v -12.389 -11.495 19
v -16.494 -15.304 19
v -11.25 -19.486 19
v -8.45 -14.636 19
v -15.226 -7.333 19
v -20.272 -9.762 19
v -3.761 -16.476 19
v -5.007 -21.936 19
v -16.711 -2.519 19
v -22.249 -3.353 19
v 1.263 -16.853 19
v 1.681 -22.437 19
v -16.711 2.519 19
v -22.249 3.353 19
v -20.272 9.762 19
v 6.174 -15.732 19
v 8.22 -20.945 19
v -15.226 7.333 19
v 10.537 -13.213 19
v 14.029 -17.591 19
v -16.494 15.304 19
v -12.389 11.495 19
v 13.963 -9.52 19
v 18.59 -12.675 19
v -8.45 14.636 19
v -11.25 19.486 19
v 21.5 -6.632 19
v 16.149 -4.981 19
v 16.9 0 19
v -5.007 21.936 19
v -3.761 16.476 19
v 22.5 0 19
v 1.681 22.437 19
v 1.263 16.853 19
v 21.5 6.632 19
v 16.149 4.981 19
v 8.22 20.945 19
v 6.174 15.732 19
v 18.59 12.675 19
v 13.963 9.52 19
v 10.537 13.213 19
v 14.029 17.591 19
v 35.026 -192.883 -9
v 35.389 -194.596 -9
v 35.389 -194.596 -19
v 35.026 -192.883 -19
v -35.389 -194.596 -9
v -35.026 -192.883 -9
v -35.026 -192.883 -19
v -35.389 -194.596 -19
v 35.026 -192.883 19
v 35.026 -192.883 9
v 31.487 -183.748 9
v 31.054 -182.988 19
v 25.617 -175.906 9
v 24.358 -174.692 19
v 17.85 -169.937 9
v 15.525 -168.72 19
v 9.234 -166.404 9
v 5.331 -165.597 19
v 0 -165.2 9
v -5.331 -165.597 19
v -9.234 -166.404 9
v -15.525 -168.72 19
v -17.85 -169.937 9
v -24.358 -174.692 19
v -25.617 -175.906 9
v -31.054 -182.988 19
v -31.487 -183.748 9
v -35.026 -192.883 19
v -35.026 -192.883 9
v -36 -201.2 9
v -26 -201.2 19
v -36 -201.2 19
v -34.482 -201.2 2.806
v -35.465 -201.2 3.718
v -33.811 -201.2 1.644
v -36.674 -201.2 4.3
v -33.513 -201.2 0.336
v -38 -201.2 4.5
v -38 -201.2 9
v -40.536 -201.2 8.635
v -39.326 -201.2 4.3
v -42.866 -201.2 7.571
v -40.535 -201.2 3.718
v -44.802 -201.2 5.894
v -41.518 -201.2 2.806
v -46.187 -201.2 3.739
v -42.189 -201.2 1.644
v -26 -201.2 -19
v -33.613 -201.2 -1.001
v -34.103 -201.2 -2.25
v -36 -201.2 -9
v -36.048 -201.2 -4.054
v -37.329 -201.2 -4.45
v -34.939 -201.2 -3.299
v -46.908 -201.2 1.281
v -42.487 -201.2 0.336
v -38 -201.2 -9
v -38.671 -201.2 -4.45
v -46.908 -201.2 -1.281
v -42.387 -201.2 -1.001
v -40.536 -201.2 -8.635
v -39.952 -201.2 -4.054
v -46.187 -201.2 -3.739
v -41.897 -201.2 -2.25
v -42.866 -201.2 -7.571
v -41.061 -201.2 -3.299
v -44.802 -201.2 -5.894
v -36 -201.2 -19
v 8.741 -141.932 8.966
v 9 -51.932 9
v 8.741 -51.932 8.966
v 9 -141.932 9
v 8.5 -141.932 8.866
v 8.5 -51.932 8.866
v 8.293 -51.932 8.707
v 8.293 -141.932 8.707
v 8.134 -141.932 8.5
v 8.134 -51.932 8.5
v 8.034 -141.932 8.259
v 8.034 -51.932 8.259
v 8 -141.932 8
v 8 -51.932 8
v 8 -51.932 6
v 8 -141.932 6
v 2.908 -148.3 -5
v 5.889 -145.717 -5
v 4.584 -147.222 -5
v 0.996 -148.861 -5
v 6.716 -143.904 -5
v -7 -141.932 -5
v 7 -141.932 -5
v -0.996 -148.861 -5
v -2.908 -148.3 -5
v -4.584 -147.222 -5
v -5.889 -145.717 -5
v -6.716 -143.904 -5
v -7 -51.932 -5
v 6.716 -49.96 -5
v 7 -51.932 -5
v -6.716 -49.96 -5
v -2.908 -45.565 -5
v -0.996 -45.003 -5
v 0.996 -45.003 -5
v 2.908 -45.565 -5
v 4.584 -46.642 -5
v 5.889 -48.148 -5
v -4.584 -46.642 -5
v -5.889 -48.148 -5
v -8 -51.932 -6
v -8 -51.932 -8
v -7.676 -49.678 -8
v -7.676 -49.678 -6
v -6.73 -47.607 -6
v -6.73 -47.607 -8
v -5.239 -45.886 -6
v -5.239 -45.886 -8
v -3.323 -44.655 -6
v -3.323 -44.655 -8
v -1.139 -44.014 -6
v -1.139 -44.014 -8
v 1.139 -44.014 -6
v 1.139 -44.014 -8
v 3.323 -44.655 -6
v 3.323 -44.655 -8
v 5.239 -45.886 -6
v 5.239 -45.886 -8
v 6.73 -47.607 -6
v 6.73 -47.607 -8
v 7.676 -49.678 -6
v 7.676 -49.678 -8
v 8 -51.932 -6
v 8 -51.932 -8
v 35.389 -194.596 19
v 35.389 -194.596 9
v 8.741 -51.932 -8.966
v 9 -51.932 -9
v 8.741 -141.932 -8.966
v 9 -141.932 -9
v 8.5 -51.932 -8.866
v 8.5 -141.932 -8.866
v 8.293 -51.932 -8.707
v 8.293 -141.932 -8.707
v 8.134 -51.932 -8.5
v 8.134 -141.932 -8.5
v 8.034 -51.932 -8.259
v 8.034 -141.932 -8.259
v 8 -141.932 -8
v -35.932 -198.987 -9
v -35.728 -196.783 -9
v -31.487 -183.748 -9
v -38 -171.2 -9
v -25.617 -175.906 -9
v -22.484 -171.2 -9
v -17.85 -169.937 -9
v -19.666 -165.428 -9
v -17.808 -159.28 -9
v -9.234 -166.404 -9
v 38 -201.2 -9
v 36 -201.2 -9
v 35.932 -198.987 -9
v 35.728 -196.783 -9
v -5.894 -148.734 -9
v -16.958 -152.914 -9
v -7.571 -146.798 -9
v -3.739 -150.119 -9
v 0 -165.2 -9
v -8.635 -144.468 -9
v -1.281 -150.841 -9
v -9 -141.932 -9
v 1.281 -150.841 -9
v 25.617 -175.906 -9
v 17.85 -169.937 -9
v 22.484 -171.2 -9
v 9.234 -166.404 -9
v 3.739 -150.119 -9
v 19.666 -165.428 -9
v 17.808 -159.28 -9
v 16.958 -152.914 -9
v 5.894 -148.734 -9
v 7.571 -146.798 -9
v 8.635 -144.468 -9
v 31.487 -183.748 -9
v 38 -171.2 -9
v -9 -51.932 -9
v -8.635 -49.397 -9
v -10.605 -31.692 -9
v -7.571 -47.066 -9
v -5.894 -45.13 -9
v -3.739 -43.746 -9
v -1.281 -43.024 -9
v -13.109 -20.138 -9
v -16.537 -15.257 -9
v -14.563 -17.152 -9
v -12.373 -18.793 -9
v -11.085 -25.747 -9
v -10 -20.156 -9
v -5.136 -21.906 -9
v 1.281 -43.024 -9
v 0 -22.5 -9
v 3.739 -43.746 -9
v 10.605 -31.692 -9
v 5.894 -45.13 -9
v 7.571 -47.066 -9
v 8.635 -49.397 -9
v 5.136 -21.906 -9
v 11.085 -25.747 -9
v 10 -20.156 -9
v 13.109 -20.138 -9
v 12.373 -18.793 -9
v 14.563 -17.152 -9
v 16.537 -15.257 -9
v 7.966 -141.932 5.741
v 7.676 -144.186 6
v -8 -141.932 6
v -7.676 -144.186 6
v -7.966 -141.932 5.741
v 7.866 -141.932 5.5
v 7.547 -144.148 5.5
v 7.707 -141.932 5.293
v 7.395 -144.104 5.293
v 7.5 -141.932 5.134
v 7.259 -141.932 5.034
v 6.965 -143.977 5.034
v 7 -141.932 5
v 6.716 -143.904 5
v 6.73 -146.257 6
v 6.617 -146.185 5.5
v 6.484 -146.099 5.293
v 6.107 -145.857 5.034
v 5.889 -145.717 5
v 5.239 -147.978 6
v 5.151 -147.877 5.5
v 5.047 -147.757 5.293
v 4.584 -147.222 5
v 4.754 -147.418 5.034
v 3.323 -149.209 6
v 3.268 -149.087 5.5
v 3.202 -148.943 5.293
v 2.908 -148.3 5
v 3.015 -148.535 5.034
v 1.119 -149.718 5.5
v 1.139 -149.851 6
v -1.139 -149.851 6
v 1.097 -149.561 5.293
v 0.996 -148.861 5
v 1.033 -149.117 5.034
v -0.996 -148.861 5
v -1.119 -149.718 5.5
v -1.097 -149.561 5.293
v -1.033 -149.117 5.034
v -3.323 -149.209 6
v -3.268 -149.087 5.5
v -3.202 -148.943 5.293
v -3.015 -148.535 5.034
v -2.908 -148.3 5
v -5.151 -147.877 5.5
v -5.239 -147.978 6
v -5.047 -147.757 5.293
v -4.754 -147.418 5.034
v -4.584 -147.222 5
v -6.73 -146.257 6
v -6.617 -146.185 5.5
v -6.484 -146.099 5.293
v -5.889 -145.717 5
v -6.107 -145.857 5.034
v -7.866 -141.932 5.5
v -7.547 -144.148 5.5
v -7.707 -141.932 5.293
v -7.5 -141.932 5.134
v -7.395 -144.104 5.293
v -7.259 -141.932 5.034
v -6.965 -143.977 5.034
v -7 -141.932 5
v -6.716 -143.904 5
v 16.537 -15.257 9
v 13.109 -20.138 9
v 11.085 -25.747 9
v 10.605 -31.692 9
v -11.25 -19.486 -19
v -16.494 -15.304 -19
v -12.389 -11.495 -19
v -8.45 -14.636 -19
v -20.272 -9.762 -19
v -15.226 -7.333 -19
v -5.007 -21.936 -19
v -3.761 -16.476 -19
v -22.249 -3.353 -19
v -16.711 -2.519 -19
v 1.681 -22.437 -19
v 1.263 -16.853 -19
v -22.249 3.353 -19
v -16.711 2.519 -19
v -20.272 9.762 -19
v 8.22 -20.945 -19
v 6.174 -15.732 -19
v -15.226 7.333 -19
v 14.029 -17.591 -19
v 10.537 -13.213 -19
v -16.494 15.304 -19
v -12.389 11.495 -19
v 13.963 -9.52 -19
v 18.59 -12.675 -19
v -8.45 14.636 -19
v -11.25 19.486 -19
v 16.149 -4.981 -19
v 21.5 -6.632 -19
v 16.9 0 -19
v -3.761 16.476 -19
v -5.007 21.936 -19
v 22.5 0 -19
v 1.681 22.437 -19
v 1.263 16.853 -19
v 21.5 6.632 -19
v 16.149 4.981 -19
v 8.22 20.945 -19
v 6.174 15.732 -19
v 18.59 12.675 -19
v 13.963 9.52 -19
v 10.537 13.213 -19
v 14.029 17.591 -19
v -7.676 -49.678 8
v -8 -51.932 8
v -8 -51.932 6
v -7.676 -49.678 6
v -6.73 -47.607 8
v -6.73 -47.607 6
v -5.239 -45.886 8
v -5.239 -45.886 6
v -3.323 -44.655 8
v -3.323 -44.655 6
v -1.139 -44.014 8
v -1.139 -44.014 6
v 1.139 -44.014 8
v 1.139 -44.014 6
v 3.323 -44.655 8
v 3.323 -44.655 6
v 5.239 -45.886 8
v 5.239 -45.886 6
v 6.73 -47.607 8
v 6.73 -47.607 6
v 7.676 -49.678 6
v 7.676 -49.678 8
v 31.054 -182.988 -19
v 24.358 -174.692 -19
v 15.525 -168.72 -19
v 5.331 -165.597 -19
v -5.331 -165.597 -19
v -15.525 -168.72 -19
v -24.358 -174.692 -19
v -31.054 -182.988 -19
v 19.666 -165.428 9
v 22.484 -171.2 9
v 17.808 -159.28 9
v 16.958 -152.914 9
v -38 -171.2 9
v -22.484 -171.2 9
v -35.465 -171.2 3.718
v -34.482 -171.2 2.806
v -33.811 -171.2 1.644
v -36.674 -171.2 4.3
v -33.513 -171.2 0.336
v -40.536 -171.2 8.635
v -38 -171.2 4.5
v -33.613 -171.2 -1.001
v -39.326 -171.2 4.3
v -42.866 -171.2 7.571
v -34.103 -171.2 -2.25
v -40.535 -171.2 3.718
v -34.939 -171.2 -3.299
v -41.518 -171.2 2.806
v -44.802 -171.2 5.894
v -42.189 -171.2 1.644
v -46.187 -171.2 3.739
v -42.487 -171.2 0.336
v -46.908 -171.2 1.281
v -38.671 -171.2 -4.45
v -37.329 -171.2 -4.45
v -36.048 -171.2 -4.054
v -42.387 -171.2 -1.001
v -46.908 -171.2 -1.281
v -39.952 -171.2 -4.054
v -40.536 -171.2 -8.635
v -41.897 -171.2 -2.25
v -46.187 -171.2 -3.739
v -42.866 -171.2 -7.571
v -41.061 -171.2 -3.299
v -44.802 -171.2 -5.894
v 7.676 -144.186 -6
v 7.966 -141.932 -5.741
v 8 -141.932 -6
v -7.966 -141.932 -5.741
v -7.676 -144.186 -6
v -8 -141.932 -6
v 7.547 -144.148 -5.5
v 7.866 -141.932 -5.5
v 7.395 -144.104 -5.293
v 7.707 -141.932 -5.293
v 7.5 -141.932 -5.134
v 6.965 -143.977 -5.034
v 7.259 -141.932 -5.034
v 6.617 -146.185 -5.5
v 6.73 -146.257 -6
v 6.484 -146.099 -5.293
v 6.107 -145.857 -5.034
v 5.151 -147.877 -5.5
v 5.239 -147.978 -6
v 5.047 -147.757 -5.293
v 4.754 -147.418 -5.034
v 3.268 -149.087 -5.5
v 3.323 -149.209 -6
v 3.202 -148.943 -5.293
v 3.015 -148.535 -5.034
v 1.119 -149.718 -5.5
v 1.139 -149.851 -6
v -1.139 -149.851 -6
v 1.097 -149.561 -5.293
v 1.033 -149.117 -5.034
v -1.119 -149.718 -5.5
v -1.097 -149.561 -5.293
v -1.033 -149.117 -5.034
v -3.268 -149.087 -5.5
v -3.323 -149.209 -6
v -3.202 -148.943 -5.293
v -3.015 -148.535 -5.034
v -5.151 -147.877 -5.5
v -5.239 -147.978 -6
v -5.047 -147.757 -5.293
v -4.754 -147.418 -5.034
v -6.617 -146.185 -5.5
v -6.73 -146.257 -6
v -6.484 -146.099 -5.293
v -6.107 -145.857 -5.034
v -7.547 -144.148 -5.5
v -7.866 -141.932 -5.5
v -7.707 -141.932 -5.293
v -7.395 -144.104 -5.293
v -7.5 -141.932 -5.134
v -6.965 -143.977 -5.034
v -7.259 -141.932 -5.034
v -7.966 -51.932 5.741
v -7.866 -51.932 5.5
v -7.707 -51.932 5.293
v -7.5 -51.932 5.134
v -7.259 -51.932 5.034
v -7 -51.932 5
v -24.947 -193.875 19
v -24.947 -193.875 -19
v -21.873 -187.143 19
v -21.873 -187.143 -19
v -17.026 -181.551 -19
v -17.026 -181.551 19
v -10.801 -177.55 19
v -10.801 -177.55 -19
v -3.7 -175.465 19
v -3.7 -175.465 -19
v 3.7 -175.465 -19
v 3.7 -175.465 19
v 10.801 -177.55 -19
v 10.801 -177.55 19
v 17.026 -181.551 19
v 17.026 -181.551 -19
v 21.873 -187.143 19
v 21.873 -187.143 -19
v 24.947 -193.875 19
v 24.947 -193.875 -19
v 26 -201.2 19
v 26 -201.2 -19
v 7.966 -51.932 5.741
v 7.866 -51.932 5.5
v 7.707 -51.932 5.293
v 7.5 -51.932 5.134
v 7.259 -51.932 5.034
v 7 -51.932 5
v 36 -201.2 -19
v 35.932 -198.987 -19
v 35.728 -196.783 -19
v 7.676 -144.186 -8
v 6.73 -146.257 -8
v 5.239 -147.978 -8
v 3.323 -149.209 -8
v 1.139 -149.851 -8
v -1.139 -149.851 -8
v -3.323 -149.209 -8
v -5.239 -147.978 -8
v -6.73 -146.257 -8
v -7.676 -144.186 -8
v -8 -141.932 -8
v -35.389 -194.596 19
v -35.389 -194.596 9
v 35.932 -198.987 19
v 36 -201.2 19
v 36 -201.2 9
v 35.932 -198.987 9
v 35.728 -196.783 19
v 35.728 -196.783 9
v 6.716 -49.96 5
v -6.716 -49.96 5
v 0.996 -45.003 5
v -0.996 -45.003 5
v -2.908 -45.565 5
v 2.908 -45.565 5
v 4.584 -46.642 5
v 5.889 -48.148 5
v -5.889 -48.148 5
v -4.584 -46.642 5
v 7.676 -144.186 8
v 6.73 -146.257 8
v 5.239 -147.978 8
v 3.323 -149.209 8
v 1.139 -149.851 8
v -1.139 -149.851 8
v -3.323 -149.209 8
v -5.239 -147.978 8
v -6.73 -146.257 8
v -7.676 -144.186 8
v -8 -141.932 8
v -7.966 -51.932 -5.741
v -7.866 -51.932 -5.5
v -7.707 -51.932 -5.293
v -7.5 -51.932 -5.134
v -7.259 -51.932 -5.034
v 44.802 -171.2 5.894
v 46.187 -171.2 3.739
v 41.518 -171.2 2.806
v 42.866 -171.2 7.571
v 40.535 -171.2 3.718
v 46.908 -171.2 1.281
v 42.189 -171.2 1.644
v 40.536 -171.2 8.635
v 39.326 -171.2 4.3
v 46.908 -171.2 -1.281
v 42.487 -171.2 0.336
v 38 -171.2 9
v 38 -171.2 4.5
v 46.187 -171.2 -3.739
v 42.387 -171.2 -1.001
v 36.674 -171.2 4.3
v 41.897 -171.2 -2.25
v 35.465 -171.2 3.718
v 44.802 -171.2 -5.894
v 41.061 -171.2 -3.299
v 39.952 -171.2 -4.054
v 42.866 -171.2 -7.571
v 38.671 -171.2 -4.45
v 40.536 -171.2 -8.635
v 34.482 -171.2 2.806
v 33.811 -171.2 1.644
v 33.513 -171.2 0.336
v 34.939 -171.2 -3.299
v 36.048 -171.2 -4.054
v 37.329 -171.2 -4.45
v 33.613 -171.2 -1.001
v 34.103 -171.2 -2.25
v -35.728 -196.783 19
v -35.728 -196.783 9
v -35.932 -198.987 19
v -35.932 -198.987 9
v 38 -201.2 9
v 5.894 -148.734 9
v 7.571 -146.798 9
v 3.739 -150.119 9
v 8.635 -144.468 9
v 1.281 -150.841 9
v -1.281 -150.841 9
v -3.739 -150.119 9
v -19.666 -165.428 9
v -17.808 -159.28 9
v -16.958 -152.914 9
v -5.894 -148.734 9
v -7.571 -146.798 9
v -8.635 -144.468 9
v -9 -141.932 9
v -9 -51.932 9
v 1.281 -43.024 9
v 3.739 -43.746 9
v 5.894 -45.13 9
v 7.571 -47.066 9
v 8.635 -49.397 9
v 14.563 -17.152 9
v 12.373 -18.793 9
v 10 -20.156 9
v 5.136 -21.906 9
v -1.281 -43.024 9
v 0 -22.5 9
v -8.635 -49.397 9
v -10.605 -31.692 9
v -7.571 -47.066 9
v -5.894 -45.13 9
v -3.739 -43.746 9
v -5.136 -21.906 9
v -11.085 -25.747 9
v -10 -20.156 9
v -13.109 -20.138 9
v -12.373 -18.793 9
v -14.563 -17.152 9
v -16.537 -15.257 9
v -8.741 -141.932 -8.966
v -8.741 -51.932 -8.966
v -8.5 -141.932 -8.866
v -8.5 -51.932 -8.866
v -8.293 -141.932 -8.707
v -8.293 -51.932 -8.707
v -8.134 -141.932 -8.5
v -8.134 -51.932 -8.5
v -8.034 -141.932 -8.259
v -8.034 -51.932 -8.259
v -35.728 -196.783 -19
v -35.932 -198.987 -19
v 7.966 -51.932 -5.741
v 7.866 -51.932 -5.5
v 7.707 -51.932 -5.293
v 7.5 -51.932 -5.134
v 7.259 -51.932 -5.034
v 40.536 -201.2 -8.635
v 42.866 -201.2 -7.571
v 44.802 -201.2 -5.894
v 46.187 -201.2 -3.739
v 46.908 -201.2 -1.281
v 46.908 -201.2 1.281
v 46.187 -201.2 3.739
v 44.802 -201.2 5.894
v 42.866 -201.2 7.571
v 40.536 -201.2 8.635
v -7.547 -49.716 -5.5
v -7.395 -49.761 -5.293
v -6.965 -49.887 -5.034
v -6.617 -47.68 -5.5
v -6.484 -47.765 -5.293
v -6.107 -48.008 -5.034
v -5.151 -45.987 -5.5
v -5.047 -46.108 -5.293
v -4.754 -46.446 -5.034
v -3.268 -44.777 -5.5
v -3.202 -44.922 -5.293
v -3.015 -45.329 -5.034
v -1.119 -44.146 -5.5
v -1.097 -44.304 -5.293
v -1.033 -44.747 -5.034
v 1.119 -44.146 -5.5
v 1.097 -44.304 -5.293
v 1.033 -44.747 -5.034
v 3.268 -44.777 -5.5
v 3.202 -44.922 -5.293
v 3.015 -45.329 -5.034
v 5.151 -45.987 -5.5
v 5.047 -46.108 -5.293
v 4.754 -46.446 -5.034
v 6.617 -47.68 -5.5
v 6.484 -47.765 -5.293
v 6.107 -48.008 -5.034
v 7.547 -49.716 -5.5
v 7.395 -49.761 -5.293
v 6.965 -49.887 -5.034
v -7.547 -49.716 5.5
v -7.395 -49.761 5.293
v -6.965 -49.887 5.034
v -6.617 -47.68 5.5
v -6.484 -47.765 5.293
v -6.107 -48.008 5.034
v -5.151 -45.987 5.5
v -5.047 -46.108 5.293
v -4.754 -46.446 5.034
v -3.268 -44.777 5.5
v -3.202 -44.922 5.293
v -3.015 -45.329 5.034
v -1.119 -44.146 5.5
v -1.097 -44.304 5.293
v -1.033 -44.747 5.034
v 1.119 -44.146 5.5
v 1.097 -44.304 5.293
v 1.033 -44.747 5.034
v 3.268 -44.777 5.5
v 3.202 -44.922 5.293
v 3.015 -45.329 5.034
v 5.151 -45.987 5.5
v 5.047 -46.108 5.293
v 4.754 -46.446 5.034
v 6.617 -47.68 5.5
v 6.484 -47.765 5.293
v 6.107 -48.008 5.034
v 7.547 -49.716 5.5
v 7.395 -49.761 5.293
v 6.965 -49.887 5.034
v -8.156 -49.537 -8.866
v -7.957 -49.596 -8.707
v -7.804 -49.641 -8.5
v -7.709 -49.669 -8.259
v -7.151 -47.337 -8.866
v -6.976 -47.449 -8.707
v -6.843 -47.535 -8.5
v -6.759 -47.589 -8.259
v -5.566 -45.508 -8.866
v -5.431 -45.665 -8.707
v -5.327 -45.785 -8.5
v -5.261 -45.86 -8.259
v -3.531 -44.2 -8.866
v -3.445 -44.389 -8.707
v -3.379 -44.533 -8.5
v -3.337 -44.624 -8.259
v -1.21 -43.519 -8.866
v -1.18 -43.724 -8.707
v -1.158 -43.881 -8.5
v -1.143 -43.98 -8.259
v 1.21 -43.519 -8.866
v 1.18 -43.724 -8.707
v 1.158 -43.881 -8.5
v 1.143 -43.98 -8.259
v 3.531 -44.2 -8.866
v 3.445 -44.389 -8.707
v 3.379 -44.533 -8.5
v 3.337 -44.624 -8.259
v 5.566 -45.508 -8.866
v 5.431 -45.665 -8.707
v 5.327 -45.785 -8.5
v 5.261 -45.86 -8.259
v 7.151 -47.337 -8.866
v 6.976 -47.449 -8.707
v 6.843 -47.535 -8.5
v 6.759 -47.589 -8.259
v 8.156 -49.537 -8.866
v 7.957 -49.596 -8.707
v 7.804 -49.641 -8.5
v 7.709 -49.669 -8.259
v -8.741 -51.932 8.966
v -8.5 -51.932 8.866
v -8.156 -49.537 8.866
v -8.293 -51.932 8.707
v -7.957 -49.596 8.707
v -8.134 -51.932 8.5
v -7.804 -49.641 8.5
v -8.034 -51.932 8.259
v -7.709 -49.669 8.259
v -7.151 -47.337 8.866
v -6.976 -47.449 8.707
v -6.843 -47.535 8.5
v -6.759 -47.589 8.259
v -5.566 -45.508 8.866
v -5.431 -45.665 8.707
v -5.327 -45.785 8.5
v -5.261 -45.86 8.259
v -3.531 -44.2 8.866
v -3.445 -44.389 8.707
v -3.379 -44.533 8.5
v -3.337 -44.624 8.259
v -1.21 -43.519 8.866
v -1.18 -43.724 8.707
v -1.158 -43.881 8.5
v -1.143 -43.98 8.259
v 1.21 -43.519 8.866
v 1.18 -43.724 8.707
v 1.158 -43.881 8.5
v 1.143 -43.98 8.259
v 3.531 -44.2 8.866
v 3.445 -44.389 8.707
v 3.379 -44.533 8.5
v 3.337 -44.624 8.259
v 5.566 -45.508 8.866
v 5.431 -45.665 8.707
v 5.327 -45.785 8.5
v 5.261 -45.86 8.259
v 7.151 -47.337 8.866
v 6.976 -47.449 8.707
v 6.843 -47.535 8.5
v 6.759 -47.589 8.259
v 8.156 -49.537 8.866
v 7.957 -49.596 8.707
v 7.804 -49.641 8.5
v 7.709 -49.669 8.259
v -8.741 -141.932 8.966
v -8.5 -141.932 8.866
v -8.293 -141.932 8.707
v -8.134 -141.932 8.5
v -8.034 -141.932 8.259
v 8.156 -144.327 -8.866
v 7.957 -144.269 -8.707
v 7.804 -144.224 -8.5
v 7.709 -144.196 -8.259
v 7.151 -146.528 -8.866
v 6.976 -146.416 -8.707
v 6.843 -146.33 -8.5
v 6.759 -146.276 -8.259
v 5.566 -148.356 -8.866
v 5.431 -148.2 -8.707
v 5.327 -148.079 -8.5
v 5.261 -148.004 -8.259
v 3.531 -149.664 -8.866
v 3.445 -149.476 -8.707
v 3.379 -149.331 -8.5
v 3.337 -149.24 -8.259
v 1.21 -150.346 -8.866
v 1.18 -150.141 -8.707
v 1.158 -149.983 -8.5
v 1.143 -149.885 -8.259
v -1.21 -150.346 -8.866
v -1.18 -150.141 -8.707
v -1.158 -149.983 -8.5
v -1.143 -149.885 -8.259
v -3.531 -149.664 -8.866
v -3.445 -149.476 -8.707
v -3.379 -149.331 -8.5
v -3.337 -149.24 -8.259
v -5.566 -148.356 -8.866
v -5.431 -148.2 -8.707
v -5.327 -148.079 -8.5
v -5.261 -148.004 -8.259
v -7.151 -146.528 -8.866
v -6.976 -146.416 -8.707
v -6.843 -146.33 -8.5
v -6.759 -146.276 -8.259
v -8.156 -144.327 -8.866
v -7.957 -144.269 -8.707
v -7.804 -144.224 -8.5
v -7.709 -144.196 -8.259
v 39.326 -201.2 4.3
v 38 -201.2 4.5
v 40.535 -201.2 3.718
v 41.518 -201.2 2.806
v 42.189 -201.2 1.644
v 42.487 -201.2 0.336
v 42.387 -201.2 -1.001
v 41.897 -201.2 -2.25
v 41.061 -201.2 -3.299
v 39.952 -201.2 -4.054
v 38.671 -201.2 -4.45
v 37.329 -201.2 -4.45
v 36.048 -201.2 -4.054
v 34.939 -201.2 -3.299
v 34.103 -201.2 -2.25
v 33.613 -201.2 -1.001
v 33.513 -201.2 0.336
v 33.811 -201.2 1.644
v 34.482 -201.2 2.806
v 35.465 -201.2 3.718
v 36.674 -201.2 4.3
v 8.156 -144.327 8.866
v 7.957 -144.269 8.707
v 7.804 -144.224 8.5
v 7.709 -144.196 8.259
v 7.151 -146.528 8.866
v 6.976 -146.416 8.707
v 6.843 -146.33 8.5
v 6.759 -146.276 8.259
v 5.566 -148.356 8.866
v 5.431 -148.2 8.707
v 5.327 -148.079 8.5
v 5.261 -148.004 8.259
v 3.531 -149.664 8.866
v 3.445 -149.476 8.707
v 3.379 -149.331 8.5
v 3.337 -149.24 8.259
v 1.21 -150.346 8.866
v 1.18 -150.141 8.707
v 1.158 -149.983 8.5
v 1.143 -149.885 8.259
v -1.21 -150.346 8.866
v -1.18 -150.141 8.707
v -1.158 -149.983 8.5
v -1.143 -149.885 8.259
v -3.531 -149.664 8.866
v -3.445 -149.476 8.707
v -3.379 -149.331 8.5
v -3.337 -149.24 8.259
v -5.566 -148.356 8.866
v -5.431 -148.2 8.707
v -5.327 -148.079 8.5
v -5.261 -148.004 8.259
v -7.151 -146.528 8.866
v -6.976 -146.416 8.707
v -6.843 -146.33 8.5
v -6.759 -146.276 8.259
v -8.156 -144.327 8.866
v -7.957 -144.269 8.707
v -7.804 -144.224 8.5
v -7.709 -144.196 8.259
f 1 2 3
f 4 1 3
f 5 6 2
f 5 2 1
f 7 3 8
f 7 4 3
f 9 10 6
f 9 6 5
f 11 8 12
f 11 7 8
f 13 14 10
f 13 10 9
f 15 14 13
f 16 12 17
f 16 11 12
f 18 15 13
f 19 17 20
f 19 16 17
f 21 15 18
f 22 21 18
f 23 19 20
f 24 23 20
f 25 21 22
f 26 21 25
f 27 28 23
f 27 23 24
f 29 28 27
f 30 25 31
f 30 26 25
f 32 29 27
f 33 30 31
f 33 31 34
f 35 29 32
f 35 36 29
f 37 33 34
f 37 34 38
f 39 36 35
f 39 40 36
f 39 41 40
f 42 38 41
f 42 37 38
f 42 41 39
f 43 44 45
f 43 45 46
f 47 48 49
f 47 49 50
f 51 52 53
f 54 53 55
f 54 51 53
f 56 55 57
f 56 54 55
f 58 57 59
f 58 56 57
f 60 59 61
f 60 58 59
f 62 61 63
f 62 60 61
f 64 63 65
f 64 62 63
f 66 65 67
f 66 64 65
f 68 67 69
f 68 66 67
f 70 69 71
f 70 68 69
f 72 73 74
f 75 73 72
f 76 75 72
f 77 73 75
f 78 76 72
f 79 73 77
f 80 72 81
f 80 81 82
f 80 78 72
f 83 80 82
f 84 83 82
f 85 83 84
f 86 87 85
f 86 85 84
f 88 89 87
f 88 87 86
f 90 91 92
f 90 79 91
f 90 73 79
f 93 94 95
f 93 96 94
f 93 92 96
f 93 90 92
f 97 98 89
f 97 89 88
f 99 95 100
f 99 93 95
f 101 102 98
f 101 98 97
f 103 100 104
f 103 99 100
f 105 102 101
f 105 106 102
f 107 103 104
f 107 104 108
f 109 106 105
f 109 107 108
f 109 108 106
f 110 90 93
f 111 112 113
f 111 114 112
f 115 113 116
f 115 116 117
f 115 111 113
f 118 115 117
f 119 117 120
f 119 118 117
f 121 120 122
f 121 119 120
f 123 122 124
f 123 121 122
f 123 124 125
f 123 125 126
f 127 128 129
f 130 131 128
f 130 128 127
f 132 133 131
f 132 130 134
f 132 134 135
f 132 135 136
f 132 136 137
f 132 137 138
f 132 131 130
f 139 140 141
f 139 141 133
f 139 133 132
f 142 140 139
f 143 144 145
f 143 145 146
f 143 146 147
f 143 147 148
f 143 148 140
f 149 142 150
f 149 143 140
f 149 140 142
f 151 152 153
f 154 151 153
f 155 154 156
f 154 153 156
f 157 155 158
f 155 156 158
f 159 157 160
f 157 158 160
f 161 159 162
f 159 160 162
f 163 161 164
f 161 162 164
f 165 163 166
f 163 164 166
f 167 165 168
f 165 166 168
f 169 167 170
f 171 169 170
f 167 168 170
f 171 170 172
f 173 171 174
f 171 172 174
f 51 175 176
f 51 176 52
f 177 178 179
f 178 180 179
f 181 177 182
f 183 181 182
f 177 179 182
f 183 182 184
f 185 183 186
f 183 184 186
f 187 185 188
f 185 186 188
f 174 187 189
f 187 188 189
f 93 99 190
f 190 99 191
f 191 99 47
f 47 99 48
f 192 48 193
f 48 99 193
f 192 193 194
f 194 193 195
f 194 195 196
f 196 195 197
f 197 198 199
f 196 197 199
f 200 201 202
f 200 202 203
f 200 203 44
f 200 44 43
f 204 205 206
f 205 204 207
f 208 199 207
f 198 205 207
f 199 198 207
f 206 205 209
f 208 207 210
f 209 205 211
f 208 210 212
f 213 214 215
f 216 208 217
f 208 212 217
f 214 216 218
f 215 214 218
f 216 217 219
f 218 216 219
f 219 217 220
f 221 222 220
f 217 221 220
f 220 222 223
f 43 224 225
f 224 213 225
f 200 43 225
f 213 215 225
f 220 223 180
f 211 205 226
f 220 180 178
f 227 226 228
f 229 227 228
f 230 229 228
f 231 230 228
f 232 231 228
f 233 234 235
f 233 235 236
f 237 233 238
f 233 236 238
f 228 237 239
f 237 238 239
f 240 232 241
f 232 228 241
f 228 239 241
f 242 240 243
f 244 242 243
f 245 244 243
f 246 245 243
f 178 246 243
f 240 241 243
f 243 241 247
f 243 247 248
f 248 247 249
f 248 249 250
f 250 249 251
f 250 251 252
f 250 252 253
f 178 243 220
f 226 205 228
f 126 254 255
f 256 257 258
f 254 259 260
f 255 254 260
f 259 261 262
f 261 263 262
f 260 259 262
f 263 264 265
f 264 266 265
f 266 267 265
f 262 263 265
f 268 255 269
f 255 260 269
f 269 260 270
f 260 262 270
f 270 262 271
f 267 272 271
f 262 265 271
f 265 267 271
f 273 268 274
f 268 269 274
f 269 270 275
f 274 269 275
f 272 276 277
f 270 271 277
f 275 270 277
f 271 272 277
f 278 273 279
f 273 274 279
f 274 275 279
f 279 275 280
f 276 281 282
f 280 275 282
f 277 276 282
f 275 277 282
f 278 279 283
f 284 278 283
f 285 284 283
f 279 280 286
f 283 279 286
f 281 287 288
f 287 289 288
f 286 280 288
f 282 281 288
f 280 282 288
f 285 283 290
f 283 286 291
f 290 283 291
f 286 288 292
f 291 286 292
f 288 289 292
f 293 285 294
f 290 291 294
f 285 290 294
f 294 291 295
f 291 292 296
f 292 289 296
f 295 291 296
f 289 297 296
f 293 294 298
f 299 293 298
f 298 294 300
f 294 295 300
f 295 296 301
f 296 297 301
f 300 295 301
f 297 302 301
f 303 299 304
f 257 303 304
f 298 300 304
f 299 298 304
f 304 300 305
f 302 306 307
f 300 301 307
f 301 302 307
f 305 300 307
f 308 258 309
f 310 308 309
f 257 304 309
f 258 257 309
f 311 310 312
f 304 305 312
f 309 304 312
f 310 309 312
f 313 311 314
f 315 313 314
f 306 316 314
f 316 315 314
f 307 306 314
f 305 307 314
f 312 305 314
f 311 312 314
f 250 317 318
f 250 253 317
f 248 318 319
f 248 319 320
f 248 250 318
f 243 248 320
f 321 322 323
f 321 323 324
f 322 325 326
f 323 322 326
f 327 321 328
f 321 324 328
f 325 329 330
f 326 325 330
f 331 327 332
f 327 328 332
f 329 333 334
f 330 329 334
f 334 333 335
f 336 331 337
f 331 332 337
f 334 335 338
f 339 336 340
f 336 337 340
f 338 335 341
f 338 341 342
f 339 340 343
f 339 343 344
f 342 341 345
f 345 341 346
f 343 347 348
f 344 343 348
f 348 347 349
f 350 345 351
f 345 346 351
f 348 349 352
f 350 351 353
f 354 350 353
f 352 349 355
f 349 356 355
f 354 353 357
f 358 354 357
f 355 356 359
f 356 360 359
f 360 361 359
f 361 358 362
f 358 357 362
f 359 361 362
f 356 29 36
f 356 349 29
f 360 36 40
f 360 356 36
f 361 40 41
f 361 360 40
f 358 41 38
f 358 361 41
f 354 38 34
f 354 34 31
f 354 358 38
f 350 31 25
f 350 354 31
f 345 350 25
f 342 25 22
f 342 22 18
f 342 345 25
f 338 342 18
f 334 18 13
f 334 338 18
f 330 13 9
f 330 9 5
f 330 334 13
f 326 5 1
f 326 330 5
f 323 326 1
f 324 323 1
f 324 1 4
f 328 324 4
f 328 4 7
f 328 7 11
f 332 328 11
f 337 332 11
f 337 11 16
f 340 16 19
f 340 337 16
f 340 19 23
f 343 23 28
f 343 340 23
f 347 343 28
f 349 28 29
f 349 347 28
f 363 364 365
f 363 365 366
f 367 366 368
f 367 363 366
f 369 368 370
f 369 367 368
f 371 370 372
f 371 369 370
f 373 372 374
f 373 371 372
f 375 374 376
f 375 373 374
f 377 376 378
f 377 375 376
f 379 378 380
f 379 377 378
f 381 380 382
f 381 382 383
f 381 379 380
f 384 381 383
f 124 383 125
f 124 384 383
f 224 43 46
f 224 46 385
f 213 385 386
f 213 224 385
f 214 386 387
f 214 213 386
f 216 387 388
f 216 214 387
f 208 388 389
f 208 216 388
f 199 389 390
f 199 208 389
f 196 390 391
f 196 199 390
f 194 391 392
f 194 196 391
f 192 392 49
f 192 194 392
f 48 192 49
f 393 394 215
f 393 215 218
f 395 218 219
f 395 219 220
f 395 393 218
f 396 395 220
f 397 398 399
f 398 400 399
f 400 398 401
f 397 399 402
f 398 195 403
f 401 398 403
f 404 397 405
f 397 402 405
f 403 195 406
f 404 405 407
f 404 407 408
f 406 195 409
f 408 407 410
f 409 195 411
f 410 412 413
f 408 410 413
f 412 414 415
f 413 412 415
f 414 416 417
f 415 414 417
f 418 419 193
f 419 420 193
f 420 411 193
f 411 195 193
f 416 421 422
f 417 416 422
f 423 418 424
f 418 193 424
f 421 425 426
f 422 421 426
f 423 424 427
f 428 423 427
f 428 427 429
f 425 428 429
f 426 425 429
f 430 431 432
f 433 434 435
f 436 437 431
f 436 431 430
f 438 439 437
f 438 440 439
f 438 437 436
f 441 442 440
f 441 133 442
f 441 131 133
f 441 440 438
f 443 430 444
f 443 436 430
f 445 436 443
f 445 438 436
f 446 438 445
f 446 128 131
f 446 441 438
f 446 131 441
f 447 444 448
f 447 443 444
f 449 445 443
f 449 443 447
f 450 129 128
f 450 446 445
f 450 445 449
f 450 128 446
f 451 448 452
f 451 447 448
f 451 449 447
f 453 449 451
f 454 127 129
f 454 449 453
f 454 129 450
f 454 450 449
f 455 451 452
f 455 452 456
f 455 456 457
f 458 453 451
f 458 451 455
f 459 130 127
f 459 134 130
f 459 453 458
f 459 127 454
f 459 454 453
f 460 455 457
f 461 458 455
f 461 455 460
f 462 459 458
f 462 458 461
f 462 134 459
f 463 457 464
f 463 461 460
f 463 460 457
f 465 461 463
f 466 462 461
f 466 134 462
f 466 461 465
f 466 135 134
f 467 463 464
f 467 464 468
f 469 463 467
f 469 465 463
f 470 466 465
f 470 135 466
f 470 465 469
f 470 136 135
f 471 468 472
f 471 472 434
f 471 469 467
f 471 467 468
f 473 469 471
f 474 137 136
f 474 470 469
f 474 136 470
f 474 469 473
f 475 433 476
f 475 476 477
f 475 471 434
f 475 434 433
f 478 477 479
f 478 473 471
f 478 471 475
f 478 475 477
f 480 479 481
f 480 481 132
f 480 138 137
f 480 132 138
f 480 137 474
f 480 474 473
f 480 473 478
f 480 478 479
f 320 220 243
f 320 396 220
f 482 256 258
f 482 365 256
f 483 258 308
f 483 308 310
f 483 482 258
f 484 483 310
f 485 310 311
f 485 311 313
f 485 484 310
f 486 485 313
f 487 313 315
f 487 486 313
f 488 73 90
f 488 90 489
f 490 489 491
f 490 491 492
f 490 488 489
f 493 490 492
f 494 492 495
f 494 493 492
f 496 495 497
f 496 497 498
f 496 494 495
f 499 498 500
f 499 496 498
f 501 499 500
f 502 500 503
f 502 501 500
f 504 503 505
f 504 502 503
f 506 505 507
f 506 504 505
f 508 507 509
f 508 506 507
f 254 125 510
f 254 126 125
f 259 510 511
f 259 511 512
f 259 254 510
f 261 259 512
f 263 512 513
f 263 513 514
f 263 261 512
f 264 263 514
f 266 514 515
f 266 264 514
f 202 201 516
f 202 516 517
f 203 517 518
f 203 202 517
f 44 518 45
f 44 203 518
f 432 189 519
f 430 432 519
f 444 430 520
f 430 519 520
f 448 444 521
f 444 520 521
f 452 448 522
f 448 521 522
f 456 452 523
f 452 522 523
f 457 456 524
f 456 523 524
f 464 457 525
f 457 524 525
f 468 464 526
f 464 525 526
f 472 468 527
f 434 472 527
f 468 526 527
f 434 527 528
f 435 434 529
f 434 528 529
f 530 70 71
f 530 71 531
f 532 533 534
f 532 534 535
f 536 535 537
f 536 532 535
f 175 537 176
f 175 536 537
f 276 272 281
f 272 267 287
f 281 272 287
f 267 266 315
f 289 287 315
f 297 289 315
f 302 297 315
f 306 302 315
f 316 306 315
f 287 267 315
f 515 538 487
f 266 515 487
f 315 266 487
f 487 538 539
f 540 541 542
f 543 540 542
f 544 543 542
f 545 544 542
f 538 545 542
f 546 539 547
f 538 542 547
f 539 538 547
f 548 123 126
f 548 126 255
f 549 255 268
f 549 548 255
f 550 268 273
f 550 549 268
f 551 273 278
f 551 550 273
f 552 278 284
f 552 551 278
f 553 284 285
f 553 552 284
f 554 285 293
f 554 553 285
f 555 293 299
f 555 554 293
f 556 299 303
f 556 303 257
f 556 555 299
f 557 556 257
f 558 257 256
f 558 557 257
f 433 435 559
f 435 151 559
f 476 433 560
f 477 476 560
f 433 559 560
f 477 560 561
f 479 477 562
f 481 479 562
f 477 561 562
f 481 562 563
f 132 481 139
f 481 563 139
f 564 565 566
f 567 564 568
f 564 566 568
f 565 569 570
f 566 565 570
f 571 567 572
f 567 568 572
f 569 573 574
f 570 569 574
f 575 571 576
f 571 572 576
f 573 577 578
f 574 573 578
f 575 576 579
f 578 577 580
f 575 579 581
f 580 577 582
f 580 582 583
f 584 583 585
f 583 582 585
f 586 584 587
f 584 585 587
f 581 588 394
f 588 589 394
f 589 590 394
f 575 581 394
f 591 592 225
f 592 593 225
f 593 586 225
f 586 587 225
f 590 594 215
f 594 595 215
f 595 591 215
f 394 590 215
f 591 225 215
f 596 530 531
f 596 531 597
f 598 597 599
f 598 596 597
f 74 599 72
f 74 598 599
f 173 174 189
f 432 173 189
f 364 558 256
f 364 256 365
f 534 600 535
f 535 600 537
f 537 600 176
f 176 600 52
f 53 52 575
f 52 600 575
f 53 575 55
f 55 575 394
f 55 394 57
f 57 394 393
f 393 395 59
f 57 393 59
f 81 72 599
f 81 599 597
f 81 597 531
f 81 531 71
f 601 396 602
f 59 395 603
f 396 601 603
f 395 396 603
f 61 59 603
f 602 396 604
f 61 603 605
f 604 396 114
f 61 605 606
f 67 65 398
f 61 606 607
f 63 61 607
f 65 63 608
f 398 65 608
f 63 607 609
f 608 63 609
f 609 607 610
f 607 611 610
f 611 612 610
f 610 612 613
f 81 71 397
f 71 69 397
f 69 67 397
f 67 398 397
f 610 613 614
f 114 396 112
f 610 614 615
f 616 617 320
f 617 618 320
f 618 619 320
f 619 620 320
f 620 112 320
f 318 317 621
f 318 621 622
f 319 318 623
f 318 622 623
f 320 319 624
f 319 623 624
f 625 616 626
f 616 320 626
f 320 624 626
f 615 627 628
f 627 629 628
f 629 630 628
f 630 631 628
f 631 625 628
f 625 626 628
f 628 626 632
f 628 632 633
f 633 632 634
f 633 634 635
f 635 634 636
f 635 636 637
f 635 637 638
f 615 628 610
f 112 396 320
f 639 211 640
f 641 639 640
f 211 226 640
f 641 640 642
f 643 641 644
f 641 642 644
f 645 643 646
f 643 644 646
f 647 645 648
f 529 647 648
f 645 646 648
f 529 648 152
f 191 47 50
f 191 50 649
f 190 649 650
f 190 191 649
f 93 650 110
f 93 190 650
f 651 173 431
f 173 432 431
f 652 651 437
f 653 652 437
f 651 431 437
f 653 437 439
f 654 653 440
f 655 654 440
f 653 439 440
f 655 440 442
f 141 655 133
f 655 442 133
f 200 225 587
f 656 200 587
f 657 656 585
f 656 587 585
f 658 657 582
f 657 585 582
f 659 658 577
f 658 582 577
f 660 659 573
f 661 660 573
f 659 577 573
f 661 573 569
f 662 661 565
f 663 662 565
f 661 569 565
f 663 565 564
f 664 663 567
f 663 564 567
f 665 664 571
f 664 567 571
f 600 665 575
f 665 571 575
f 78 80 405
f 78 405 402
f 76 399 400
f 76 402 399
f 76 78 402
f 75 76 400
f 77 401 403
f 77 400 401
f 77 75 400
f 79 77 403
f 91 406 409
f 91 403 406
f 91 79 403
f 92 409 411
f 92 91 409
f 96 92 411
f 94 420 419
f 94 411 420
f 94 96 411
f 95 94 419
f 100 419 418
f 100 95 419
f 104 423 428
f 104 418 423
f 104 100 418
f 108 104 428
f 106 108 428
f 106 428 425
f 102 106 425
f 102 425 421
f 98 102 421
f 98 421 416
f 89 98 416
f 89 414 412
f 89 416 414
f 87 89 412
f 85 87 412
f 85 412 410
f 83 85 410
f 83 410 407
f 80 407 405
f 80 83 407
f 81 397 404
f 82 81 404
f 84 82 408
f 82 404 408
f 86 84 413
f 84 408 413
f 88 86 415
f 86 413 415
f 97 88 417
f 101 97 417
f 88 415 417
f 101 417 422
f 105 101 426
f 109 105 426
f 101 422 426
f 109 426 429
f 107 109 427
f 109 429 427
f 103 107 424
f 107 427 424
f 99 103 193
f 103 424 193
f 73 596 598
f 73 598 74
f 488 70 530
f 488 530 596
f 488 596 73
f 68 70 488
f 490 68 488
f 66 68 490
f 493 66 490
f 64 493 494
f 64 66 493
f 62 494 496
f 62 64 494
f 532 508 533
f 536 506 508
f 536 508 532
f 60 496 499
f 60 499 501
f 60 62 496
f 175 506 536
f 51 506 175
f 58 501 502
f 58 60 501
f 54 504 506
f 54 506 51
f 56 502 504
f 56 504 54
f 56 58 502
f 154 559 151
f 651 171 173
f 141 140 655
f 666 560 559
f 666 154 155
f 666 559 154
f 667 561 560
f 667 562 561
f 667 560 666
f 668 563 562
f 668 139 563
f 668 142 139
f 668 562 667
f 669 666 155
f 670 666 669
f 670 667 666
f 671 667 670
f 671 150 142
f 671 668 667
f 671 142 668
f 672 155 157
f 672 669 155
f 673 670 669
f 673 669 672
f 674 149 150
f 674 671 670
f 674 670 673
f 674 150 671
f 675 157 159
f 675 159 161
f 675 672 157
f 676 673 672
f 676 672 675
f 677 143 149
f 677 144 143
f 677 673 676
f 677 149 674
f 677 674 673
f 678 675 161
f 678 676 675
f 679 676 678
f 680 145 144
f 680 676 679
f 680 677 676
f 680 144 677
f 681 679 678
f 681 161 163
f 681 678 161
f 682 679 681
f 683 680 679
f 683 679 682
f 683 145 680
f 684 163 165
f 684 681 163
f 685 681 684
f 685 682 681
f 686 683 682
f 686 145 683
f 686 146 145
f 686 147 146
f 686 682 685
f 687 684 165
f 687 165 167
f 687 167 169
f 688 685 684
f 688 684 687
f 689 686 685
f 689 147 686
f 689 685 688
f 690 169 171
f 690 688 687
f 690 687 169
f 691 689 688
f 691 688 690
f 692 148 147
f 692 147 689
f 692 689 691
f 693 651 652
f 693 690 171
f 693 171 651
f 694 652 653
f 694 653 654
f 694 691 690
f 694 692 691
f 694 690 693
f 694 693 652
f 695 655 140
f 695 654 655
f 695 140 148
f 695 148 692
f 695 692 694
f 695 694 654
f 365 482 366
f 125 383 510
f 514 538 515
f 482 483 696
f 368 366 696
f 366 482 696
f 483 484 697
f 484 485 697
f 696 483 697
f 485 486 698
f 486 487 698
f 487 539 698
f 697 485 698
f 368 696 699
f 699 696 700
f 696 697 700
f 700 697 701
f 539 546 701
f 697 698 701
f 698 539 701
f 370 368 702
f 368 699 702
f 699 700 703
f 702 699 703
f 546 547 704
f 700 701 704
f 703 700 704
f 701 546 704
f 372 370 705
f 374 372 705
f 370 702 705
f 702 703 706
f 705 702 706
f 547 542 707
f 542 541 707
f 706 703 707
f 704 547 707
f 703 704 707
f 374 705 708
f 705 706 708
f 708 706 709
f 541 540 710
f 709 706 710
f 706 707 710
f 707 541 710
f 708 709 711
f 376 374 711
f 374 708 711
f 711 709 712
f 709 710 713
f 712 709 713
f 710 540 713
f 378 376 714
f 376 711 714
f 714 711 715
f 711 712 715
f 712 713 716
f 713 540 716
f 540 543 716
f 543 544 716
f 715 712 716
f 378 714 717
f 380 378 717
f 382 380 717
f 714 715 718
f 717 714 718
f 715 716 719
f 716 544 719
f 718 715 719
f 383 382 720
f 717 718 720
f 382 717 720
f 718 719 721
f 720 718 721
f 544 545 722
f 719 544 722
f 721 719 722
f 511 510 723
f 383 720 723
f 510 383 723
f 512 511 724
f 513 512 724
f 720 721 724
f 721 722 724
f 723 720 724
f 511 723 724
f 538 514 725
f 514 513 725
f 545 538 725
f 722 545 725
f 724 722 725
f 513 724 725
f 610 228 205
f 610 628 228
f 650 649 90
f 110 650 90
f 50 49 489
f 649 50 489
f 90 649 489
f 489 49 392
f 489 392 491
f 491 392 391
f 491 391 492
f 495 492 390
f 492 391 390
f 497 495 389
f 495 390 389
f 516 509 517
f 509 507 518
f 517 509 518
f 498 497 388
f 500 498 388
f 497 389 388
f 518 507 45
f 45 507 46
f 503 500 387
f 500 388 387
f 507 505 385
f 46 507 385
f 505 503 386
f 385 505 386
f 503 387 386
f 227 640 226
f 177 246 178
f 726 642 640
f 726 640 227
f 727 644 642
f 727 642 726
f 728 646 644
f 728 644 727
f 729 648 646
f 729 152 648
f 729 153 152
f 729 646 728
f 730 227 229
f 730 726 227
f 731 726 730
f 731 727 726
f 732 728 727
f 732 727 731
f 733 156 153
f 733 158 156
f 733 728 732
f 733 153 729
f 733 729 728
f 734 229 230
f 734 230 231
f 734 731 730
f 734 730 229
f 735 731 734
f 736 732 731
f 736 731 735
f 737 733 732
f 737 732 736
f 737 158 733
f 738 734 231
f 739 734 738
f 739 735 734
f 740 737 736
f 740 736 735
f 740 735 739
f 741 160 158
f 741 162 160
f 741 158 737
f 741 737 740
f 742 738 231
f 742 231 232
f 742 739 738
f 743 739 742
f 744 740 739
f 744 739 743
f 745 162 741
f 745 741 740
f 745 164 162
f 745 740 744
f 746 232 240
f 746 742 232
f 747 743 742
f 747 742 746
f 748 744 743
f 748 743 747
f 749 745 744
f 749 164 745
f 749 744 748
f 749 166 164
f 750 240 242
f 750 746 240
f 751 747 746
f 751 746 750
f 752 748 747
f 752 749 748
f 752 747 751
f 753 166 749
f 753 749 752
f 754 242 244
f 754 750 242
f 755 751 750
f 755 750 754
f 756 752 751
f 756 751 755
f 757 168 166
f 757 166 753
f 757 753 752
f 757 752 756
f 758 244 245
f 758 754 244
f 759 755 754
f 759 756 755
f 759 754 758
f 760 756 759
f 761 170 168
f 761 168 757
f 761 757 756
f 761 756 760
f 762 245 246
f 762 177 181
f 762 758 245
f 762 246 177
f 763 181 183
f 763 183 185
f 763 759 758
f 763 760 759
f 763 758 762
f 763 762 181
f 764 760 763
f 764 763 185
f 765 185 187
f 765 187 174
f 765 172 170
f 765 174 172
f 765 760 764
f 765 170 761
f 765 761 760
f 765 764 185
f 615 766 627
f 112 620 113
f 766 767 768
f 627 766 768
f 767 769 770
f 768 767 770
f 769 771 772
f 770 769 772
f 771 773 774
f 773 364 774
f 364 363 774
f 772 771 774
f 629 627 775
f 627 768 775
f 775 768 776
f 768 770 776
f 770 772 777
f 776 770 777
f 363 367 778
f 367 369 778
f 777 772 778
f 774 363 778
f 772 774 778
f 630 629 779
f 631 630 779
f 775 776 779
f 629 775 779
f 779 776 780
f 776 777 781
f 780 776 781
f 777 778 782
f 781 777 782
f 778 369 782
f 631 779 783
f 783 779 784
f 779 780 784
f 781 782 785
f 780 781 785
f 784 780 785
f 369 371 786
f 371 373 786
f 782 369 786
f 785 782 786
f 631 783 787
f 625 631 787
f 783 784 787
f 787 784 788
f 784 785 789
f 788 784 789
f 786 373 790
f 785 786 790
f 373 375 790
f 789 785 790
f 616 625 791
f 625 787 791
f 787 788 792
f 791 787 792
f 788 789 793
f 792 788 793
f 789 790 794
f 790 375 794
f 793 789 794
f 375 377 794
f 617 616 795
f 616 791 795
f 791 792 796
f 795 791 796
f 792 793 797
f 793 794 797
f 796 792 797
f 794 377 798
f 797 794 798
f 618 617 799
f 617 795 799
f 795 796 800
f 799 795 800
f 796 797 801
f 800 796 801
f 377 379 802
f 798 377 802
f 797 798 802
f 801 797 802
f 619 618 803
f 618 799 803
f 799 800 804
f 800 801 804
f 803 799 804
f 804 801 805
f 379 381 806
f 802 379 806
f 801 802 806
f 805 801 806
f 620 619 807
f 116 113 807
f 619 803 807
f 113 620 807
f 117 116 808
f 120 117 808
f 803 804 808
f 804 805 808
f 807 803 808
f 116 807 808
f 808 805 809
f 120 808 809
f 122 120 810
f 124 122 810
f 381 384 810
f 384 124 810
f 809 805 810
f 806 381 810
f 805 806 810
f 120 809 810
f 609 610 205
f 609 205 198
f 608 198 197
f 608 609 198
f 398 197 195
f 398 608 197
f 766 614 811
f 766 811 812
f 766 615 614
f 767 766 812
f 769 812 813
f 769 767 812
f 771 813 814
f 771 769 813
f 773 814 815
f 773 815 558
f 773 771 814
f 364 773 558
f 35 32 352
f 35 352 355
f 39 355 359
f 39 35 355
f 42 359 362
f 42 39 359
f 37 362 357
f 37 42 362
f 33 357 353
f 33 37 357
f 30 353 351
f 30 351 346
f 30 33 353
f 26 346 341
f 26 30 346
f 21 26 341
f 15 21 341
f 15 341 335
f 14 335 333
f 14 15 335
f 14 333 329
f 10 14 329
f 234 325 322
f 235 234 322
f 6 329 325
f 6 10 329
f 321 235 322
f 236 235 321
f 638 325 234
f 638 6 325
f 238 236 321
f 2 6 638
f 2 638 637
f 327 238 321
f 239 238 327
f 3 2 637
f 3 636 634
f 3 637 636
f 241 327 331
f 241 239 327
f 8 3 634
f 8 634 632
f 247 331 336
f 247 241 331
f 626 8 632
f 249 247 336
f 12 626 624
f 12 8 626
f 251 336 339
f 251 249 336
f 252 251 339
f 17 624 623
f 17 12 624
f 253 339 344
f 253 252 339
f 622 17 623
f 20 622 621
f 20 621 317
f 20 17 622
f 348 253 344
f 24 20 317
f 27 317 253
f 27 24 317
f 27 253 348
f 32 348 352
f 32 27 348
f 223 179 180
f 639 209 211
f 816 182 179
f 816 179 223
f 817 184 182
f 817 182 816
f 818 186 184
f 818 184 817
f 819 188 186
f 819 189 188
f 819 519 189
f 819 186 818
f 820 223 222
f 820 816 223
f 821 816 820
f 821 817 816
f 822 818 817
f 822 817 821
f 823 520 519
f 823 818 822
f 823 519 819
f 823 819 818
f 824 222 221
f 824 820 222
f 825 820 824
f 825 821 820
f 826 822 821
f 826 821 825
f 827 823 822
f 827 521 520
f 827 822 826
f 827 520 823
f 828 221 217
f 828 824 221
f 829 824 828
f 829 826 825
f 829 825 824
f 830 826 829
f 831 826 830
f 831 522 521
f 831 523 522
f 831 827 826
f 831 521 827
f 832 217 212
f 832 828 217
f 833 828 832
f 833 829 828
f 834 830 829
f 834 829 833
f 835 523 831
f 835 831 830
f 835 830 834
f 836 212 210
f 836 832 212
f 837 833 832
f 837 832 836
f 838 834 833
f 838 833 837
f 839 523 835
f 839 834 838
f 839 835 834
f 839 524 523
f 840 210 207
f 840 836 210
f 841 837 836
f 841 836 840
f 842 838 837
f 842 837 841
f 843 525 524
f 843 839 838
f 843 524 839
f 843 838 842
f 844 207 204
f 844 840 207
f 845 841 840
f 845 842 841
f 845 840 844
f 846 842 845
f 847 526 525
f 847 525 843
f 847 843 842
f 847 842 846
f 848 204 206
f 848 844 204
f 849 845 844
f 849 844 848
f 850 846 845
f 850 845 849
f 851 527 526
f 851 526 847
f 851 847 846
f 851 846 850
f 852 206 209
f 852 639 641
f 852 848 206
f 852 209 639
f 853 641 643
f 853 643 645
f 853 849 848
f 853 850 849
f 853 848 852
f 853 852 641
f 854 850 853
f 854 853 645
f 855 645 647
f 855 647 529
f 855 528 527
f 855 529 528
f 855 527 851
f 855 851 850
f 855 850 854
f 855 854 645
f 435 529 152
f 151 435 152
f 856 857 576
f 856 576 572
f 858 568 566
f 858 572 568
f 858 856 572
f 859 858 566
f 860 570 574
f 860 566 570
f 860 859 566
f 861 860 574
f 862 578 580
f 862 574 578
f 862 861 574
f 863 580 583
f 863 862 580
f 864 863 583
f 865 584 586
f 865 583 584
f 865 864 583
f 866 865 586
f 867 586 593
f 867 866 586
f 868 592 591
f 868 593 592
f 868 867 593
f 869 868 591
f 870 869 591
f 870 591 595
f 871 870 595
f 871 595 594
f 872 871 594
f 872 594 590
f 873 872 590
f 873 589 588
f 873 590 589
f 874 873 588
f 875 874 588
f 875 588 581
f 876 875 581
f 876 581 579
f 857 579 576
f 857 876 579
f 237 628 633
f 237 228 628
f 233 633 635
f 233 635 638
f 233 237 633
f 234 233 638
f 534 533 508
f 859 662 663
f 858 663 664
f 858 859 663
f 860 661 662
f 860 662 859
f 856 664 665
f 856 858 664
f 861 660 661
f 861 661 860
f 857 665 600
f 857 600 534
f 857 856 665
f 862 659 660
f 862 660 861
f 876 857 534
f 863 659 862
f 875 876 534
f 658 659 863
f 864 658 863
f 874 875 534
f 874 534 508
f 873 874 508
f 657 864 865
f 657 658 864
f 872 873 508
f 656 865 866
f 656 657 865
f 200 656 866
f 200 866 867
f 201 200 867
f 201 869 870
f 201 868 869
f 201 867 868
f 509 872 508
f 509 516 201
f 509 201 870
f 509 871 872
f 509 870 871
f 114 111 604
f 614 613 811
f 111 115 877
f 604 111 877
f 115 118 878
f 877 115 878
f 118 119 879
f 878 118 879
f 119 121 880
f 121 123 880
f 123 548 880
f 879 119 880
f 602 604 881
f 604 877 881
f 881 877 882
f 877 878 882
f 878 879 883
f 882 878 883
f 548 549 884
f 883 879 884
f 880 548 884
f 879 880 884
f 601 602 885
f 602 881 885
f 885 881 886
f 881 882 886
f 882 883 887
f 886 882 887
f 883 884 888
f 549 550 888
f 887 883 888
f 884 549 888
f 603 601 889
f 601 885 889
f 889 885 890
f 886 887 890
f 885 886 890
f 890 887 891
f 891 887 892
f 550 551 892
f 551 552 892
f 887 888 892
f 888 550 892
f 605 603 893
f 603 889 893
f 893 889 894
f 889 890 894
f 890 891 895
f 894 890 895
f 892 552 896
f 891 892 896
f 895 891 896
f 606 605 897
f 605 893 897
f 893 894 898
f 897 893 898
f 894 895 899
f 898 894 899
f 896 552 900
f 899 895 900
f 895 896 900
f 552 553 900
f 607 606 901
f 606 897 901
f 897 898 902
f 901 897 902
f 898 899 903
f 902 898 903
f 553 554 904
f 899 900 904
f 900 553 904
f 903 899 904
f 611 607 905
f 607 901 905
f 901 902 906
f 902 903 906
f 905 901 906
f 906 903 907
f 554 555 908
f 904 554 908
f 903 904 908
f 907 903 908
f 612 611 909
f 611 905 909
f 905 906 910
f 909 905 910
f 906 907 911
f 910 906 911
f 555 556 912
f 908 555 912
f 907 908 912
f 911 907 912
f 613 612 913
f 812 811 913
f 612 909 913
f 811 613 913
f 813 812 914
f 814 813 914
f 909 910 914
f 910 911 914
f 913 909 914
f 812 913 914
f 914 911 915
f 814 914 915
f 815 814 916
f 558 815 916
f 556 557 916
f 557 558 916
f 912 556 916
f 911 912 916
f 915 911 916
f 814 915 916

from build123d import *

# Parameters (mm, degrees)
BOSS_EXTRUDE4_DEPTH     = 19
SKETCH1_R               = 22.5
SKETCH1_R_2             = 16.9
BOSS_EXTRUDE4_2_DEPTH   = 19
BOSS_EXTRUDE5_DEPTH     = 9
CUT_EXTRUDE1_DEPTH      = 4
FILLET1_R               = 1
FILLET2_R               = 22.5
FILLET3_R               = 40
BOSS_EXTRUDE6_DEPTH     = 30
CUT_EXTRUDE2_DEPTH      = 209.505251732
CUT_EXTRUDE2_DEPTH_BACK = 209.505251732
SKETCH6_R               = 26
CUT_EXTRUDE3_DEPTH      = 201.224099449
CUT_EXTRUDE3_DEPTH_BACK = 201.224099449
SKETCH7_R               = 4.5


with BuildPart() as part:
    # Sketch1 → Boss-Extrude4 (new, symmetric)
    with BuildSketch(Plane.XY):
        with BuildLine():
            Line((-35.026029259, -192.882712321), (-35.389042583, -194.595784299))
            ThreePointArc((-35.389042583, -194.595784299), (-35.846935246, -197.883792302), (-36, -201.2))
            Line((-36, -201.2), (-26, -201.2))
            ThreePointArc((-26, -201.2), (0, -175.2), (26, -201.2))
            Line((26, -201.2), (36, -201.2))
            ThreePointArc((36, -201.2), (35.846935246, -197.883792302), (35.389042583, -194.595784299))
            Line((35.389042583, -194.595784299), (35.026029259, -192.882712321))
            ThreePointArc((35.026029259, -192.882712321), (0, -165.2), (-35.026029259, -192.882712321))
        make_face()
    extrude(amount=BOSS_EXTRUDE4_DEPTH, both=True)



with BuildPart() as body_2:
    # Sketch1 → Boss-Extrude4 2 (new, symmetric)
    with BuildSketch(Plane.XY):
        Circle(SKETCH1_R)
        Circle(SKETCH1_R_2, mode=Mode.SUBTRACT)
    extrude(amount=BOSS_EXTRUDE4_2_DEPTH, both=True)


with BuildPart() as part_1:
    add(part.part)

    add(body_2.part)  # Boss-Extrude5 merges body 2
    # Sketch1<7> → Boss-Extrude5 (add, symmetric)
    with BuildSketch(Plane.XY):
        with BuildLine():
            Line((-10, -20.155644371), (-17.849697213, -169.936789841))
            ThreePointArc((-17.849697213, -169.936789841), (0, -165.2), (17.849697213, -169.936789841))
            Line((17.849697213, -169.936789841), (10, -20.155644371))
            ThreePointArc((10, -20.155644371), (0, -22.5), (-10, -20.155644371))
        make_face()
    extrude(amount=BOSS_EXTRUDE5_DEPTH, both=True)

    # Sketch2 → Cut-Extrude1 (cut)
    with BuildSketch(Plane.XY.offset(9)):
        with BuildLine():
            Line((8, -51.932208026), (8, -141.932208026))
            ThreePointArc((8, -141.932208026), (0, -149.932208026), (-8, -141.932208026))
            Line((-8, -141.932208026), (-8, -51.932208026))
            ThreePointArc((-8, -51.932208026), (0, -43.932208026), (8, -51.932208026))
        make_face()
    cut_extrude1 = extrude(amount=-CUT_EXTRUDE1_DEPTH, mode=Mode.SUBTRACT)

    # Mirror1: Cut-Extrude1 across plane
    add(cut_extrude1.mirror(Plane.XY), mode=Mode.SUBTRACT)

    # Fillet1
    fillet1_edges = [part_1.edges().sort_by_distance(p)[0] for p in [
        (0, -43.932208026, 5),
        (8, -96.932208026, 5),
        (0, -149.932208026, 5),
        (-8, -96.932208026, 5),
        (0, -43.932208026, 9),
        (-8, -96.932208026, 9),
        (0, -149.932208026, 9),
        (8, -96.932208026, 9),
        (0, -43.932208026, -9),
        (-8, -96.932208026, -9),
        (0, -149.932208026, -9),
        (8, -96.932208026, -9),
        (0, -43.932208026, -5),
        (-8, -96.932208026, -5),
        (0, -149.932208026, -5),
        (8, -96.932208026, -5),
    ]]
    fillet(fillet1_edges, radius=FILLET1_R)

    # Fillet2
    fillet2_edges = [part_1.edges().sort_by_distance(p)[0] for p in [
        (10, -20.155644371, 0),
        (-10, -20.155644371, 0),
    ]]
    fillet(fillet2_edges, radius=FILLET2_R)

    # Fillet3
    fillet3_edges = [part_1.edges().sort_by_distance(p)[0] for p in [
        (-17.849697213, -169.936789841, 0),
        (17.849697213, -169.936789841, 0),
    ]]
    fillet(fillet3_edges, radius=FILLET3_R)

    # Sketch3 → Boss-Extrude6 (add)
    with BuildSketch(Plane(origin=(0, -171.2, 0), x_dir=(1, 0, 0), z_dir=(0, 1, 0))):
        with BuildLine():
            Line((-38, 9), (38, 9))
            ThreePointArc((38, 9), (47, 0), (38, -9))
            Line((38, -9), (-38, -9))
            ThreePointArc((-38, -9), (-47, 0), (-38, 9))
        make_face()
    extrude(amount=-BOSS_EXTRUDE6_DEPTH)

    # Sketch6 → Cut-Extrude2 (cut, two sides: drawn at the far end of the back side and taken through both)
    with BuildSketch(Plane.XY.offset(9).offset(-CUT_EXTRUDE2_DEPTH_BACK)):
        with Locations((0, -201.2)):
            Circle(SKETCH6_R)
    extrude(amount=CUT_EXTRUDE2_DEPTH + CUT_EXTRUDE2_DEPTH_BACK, mode=Mode.SUBTRACT)

    # Sketch7 → Cut-Extrude3 (cut, two sides: drawn at the far end of the back side and taken through both)
    with BuildSketch(Plane(origin=(0, -171.2, 0), x_dir=(1, 0, 0), z_dir=(0, 1, 0)).offset(-CUT_EXTRUDE3_DEPTH_BACK)):
        with Locations(Location((-38, 0, 0), (0, 0, 270))):
            Circle(SKETCH7_R)
        with Locations(Location((38, 0, 0), (0, 0, 270))):
            Circle(SKETCH7_R)
    extrude(amount=CUT_EXTRUDE3_DEPTH + CUT_EXTRUDE3_DEPTH_BACK, mode=Mode.SUBTRACT)


solid = part_1.part
